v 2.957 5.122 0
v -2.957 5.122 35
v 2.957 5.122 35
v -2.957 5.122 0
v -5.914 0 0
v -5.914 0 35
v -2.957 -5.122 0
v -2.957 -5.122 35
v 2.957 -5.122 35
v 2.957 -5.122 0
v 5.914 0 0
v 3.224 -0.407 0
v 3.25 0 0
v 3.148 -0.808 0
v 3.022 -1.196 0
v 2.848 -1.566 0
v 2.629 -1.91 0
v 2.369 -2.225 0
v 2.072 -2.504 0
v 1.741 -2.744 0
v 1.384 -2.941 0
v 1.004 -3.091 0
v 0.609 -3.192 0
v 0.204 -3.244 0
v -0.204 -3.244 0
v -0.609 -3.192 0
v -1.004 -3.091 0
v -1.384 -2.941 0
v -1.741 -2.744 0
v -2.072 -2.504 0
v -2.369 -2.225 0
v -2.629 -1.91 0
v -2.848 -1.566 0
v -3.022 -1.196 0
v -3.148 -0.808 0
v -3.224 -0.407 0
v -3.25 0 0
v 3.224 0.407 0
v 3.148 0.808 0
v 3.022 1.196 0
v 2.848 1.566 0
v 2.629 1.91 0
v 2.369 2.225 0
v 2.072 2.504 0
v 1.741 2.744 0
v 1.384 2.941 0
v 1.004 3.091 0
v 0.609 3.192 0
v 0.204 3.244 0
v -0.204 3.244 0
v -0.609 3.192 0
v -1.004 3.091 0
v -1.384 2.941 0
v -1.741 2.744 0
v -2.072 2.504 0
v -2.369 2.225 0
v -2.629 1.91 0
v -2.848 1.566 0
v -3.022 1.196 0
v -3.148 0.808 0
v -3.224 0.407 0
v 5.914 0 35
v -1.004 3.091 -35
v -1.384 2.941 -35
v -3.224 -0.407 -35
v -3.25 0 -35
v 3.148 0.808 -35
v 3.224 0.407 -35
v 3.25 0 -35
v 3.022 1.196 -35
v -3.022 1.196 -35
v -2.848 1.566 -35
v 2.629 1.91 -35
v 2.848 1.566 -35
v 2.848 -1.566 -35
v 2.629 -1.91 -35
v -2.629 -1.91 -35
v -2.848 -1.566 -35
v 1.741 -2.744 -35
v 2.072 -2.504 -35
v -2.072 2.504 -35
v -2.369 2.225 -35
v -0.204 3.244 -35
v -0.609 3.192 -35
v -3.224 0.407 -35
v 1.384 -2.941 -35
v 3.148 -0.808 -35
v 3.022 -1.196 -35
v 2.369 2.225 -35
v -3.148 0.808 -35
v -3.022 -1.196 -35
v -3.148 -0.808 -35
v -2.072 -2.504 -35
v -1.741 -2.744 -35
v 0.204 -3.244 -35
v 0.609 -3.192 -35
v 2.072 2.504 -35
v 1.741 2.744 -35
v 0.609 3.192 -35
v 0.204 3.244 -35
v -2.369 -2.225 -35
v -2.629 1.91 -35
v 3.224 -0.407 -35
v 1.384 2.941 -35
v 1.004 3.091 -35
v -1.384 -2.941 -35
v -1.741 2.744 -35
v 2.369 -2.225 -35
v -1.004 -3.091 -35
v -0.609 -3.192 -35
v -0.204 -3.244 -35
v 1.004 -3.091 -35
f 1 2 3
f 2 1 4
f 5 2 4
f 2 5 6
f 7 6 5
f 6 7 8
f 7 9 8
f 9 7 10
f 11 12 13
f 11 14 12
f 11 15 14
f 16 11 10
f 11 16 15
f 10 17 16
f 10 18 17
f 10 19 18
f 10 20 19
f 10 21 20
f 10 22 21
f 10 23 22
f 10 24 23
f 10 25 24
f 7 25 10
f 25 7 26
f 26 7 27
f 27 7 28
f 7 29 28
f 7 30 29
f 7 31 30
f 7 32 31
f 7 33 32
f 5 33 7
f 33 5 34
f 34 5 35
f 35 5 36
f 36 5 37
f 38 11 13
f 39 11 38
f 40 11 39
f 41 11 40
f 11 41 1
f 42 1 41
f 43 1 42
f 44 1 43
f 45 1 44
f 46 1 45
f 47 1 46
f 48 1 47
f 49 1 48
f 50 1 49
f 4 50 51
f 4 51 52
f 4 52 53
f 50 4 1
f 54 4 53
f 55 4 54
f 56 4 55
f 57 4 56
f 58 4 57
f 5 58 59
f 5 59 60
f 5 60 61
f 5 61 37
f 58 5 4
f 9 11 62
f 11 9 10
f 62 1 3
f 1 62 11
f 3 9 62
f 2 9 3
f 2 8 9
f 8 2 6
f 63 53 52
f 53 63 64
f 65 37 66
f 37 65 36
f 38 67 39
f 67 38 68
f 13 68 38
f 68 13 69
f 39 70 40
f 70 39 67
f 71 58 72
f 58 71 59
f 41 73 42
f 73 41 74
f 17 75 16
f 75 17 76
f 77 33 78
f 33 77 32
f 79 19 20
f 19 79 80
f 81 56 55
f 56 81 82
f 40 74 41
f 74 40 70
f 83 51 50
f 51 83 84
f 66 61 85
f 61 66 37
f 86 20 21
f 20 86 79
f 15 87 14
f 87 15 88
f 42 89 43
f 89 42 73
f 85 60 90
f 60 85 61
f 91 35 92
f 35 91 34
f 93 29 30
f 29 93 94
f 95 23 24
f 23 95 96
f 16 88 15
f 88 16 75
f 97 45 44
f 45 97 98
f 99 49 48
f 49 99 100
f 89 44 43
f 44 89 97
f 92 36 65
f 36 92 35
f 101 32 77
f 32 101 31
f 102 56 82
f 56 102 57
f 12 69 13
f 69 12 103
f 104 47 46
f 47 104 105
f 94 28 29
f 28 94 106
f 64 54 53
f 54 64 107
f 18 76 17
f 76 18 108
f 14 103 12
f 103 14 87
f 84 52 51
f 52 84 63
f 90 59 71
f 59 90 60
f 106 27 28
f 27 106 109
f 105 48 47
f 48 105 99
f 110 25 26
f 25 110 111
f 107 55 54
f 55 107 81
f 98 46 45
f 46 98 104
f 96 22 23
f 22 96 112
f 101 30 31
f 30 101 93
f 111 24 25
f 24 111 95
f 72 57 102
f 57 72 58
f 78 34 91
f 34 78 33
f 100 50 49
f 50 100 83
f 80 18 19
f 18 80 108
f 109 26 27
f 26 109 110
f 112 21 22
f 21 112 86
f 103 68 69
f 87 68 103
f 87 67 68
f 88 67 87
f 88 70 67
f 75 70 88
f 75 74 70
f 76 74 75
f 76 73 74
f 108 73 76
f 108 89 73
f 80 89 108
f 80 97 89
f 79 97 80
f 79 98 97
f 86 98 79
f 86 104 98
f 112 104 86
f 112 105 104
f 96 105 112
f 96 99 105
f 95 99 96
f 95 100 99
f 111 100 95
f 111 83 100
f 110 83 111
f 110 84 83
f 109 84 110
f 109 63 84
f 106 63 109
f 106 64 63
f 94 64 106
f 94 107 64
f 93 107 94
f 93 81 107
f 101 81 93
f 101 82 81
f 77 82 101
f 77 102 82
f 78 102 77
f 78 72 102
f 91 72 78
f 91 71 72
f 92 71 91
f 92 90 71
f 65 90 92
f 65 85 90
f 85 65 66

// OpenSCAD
$fn = 50;


difference() {
	union() {
		linear_extrude(height = 35) {
			polygon(points = [[5.9142500000, 0.0000000000], [2.9571250000, 5.1218907443], [-2.9571250000, 5.1218907443], [-5.9142500000, 0.0000000000], [-2.9571250000, -5.1218907443], [2.9571250000, -5.1218907443]]);
		}
		translate(v = [0, 0, -35]) {
			cylinder(h = 35, r = 3.2500000000);
		}
	}
	union();
}
